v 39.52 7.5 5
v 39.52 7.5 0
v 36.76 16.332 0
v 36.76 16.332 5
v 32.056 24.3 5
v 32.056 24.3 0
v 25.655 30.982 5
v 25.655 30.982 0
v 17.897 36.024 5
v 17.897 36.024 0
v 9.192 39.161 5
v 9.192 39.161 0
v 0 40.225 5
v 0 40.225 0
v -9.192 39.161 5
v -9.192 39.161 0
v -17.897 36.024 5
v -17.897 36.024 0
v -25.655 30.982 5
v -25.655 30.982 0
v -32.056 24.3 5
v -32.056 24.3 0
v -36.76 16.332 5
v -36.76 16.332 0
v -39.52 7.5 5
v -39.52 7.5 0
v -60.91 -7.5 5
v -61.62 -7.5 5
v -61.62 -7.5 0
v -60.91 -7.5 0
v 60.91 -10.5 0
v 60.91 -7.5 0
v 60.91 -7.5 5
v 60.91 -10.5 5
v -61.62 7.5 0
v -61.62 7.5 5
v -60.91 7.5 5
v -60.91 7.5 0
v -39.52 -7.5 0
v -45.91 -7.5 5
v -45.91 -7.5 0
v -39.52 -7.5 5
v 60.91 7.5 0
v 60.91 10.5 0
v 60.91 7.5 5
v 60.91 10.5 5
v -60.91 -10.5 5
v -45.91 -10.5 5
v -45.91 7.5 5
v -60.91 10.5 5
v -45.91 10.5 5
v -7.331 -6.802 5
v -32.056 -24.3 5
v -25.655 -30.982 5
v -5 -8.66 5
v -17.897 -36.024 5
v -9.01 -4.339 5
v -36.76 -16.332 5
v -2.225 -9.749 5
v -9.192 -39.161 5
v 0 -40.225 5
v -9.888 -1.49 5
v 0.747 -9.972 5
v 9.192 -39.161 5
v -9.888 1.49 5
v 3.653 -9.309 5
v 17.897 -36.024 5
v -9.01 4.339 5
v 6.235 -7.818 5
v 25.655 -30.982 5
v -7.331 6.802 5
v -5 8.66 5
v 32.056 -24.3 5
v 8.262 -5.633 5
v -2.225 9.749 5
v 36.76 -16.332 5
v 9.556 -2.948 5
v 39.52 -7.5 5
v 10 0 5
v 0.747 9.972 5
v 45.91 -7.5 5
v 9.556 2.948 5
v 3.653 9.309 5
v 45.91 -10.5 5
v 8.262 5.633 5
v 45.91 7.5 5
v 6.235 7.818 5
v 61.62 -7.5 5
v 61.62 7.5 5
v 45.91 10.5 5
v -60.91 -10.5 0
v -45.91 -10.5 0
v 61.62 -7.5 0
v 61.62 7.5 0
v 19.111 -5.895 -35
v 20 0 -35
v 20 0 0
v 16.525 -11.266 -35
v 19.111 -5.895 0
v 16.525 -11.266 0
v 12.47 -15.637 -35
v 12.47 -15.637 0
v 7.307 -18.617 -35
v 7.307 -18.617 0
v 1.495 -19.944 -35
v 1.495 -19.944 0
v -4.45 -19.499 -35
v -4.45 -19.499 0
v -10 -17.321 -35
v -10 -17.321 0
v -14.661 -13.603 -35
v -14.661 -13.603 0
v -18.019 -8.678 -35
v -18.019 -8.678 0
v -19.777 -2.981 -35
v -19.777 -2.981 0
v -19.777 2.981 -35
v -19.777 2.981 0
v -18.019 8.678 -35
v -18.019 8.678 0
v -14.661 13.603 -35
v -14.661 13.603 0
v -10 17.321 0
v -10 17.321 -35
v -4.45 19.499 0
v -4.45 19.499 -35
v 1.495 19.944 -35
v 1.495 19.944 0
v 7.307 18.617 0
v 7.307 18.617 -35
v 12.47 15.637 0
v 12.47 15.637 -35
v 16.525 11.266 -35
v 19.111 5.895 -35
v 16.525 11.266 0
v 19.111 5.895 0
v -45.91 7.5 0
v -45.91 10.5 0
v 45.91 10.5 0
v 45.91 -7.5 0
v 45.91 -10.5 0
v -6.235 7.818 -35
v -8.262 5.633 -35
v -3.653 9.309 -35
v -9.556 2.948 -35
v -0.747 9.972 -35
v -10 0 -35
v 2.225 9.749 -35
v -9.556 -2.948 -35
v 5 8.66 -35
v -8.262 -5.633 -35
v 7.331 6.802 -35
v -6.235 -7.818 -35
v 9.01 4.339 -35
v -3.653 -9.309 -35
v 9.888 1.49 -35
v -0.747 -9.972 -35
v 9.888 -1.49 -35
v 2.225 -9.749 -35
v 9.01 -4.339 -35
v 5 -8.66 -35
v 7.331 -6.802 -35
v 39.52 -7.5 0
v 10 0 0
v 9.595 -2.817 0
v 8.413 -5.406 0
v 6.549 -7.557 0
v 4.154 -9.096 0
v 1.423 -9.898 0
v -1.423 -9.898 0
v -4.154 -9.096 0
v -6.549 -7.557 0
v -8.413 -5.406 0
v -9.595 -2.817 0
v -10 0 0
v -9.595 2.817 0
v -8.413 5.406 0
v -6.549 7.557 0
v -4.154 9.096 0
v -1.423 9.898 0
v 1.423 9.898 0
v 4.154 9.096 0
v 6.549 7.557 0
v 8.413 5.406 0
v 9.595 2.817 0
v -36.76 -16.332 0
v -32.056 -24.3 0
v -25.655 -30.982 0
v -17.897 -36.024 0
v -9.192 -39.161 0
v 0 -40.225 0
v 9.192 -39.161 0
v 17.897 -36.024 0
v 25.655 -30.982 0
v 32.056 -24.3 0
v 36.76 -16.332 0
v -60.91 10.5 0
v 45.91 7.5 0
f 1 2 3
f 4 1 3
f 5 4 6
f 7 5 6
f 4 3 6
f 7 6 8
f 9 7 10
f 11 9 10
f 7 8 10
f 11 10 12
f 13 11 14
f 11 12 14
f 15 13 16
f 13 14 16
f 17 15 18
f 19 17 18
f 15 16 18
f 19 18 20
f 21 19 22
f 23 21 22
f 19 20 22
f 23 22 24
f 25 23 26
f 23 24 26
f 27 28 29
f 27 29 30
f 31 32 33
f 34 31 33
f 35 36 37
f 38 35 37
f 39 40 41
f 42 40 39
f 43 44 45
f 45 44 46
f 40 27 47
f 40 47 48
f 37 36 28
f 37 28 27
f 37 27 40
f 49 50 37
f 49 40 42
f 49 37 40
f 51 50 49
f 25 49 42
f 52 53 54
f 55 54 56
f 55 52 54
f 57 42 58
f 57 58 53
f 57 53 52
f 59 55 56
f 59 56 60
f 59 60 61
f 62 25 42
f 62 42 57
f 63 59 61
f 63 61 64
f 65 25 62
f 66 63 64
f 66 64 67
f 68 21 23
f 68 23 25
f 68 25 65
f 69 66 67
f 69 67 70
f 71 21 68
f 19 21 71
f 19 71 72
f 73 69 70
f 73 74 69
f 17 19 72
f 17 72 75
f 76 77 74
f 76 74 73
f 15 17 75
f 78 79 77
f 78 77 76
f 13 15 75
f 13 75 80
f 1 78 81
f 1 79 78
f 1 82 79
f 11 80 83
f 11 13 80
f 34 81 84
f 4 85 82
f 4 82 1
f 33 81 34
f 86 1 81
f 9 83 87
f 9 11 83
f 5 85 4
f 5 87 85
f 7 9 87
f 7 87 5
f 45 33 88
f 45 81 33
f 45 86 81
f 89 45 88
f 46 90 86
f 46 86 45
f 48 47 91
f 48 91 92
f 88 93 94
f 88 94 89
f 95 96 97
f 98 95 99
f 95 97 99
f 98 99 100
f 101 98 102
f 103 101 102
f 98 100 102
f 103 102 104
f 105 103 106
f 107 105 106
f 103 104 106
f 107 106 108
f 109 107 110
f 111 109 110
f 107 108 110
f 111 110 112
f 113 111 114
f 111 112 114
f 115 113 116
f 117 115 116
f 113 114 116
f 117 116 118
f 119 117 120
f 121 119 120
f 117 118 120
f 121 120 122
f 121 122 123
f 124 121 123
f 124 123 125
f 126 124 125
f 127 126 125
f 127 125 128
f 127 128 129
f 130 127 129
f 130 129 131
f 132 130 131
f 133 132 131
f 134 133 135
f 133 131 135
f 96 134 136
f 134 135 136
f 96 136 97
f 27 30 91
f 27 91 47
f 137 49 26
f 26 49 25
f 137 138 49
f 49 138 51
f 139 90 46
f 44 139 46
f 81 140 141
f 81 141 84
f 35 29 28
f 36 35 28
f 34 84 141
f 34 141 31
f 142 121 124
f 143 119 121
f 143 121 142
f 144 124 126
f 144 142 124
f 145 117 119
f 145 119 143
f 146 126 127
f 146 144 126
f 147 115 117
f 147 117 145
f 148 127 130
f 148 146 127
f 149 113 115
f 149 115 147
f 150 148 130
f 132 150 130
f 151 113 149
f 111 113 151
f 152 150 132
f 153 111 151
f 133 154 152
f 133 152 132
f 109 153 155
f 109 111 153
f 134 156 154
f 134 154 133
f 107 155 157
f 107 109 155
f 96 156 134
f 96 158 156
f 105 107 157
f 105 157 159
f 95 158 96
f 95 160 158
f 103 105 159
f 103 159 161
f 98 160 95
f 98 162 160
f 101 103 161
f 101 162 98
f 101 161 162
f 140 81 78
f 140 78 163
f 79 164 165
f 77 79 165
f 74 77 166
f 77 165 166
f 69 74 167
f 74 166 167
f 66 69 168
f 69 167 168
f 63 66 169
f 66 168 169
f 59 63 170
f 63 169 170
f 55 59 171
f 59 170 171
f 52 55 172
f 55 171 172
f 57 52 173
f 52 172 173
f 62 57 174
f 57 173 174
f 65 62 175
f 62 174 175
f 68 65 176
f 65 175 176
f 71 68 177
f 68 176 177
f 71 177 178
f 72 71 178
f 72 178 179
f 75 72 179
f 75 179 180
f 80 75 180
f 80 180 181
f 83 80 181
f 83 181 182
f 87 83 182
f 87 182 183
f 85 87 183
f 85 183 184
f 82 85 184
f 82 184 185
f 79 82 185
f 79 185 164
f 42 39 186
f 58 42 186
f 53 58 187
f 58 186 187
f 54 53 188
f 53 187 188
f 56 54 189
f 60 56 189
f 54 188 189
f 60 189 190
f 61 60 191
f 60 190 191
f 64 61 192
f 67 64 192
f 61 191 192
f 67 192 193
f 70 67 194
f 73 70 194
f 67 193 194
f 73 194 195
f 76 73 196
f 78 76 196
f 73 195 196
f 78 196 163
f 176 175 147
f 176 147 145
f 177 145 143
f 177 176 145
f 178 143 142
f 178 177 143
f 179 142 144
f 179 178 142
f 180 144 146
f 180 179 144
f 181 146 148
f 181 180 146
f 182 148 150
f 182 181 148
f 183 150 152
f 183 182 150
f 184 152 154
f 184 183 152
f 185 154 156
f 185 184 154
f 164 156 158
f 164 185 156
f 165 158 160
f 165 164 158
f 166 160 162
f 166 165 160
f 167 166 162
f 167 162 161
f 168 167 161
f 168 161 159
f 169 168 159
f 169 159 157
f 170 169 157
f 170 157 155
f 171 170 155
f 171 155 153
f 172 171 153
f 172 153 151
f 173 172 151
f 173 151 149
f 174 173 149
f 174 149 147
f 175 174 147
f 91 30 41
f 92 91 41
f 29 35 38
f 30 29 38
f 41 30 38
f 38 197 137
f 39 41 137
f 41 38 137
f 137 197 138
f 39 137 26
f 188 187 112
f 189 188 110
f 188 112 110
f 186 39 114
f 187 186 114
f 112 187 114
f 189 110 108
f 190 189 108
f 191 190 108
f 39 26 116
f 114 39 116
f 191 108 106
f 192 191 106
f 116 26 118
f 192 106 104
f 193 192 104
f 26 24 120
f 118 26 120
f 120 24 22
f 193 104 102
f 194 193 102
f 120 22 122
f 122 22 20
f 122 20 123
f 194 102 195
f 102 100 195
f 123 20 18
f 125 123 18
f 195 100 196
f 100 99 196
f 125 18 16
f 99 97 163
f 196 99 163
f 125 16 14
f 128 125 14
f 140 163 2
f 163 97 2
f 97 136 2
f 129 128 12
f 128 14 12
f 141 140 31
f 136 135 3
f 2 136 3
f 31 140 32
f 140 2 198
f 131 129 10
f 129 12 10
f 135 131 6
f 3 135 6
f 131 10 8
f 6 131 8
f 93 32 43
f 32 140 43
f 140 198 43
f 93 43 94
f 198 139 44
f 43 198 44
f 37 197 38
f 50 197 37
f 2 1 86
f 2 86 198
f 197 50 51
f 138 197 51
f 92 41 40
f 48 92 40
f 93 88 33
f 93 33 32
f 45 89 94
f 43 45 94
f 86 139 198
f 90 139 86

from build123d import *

# Parameters (mm, degrees)
IZIM1_R                           = 40.225
Y_KSEKLIK_EKSTR_ZYON1_DEPTH       = 5
IZIM2_W                           = 5
IZIM2_H                           = 15
Y_KSEKLIK_EKSTR_ZYON2_DEPTH       = 64
IZIM3_W                           = 8.48037671
IZIM3_H                           = 5
KES_EKSTR_ZYON1_DEPTH             = 128
IZIM6_R                           = 25
Y_KSEKLIK_EKSTR_ZYON4_DEPTH       = 5
IZIM7_W                           = 5
IZIM7_H                           = 5
Y_KSEKLIK_EKSTR_ZYON5_DEPTH       = 2
IZIM8_W                           = 5
IZIM8_H                           = 5
Y_KSEKLIK_EKSTR_ZYON6_DEPTH       = 7
IZIM9_W                           = 5.33982185
IZIM9_H                           = 8.96327239
KES_EKSTR_ZYON2_DEPTH             = 23
IZIM10_W                          = 16.71
IZIM10_H                          = 5
Y_KSEKLIK_EKSTR_ZYON7_DEPTH       = 15
IZIM13_W                          = 0.39
IZIM13_H                          = 5
Y_KSEKLIK_EKSTR_ZYON9_DEPTH       = 15
Y_KSEKLIK_EKSTR_ZYON10_DEPTH      = 3
Y_KSEKLIK_EKSTR_ZYON10_DEPTH_BACK = 18
IZIM14_W                          = 15
IZIM14_H                          = 5
IZIM11_W                          = 15.71
IZIM11_H                          = 5
Y_KSEKLIK_EKSTR_ZYON11_DEPTH      = 15
Y_KSEKLIK_EKSTR_ZYON12_DEPTH      = 3
Y_KSEKLIK_EKSTR_ZYON12_DEPTH_BACK = 18
IZIM16_W                          = 15
IZIM16_H                          = 5
IZIM17_W                          = 120.128605811
IZIM17_H                          = 27.620146719
KES_EKSTR_ZYON3_DEPTH             = 50
IZIM18_R                          = 5
KES_EKSTR_ZYON4_DEPTH             = 100
IZIM20_R                          = 20
IZIM20_R_2                        = 10
Y_KSEKLIK_EKSTR_ZYON14_DEPTH      = 35
IZIM21_R                          = 10
KES_EKSTR_ZYON5_DEPTH             = 45


with BuildPart() as part:
    # Çizim1 → Yükseklik-Ekstrüzyon1 (new body)
    with BuildSketch(Plane.XY):
        Circle(IZIM1_R)
    extrude(amount=Y_KSEKLIK_EKSTR_ZYON1_DEPTH)

    # Çizim2 → Yükseklik-Ekstrüzyon2 (add, symmetric)
    with BuildSketch(Plane(origin=(0, 0, 0), x_dir=(0, 0, -1), z_dir=(1, 0, 0))):
        with Locations((-2.5, 0)):
            Rectangle(IZIM2_W, IZIM2_H)
    extrude(amount=Y_KSEKLIK_EKSTR_ZYON2_DEPTH, both=True)

    # Çizim3 → Kes-Ekstrüzyon1 (cut)
    with BuildSketch(Plane.XZ.offset(7.5)):
        with Locations((-59.759811645, 2.5)):
            Rectangle(IZIM3_W, IZIM3_H)
    extrude(amount=-KES_EKSTR_ZYON1_DEPTH, mode=Mode.SUBTRACT)

    # Çizim7 → Yükseklik-Ekstrüzyon5 (add)
    with BuildSketch(Plane.XY.offset(5)):
        Polygon((35.024990748, -17.334936491), (30.694863729, -14.834936491), (28.194863729, -19.165063509), (32.524990748, -21.665063509), align=None)
        with Locations((0, 36.5)):
            Rectangle(IZIM7_W, IZIM7_H)
        Polygon((-32.524990748, -21.665063509), (-28.194863729, -19.165063509), (-30.694863729, -14.834936491), (-35.024990748, -17.334936491), align=None)
    extrude(amount=Y_KSEKLIK_EKSTR_ZYON5_DEPTH)


with BuildPart() as body_2:
    # Çizim6 → Yükseklik-Ekstrüzyon4 (new body)
    with BuildSketch(Plane.XY.offset(25)):
        Circle(IZIM6_R)
    extrude(amount=Y_KSEKLIK_EKSTR_ZYON4_DEPTH)

    # Çizim8 → Yükseklik-Ekstrüzyon6 (add)
    with BuildSketch(Plane.XY.offset(30)):
        Polygon((22.034609691, -9.834936491), (17.704482672, -7.334936491), (15.204482672, -11.665063509), (19.534609691, -14.165063509), align=None)
        with Locations((0, 21.5)):
            Rectangle(IZIM8_W, IZIM8_H)
        Polygon((-19.534609691, -14.165063509), (-15.204482672, -11.665063509), (-17.704482672, -7.334936491), (-22.034609691, -9.834936491), align=None)
    extrude(amount=-Y_KSEKLIK_EKSTR_ZYON6_DEPTH)


    add(part.part)  # loft1 joins it to this body
    # loft from a face of the part (loft1)
    loft([body_2.faces().sort_by_distance((-18.619546181, -10.75, 23))[0], body_2.faces().sort_by_distance((-31.609927238, -18.25, 7))[0]])

    # loft from a face of the part (loft3)
    loft([body_2.faces().sort_by_distance((0, 36.5, 7))[0], body_2.faces().sort_by_distance((0, 21.5, 23))[0]])

    # Çizim9 → Kes-Ekstrüzyon2 (cut)
    with BuildSketch(Plane.XZ.offset(7.5)):
        with Locations((62.899534215, 2.077883617)):
            Rectangle(IZIM9_W, IZIM9_H)
    extrude(amount=-KES_EKSTR_ZYON2_DEPTH, mode=Mode.SUBTRACT)

    # Çizim10 → Yükseklik-Ekstrüzyon7 (add)
    with BuildSketch(Plane.XZ.offset(7.5)):
        with Locations((-52.87462329, 2.5)):
            Rectangle(IZIM10_W, IZIM10_H)
    extrude(amount=-Y_KSEKLIK_EKSTR_ZYON7_DEPTH)

    # Çizim13 → Yükseklik-Ekstrüzyon9 (add)
    with BuildSketch(Plane.XZ.offset(7.5)):
        with Locations((-61.42462329, 2.5)):
            Rectangle(IZIM13_W, IZIM13_H)
    extrude(amount=-Y_KSEKLIK_EKSTR_ZYON9_DEPTH)

    # Çizim14 → Yükseklik-Ekstrüzyon10 (add, two sides: drawn at the far end of the back side and taken through both)
    with BuildSketch(Plane.XZ.offset(7.5).offset(-Y_KSEKLIK_EKSTR_ZYON10_DEPTH_BACK)):
        with Locations((-53.40962329, 2.5)):
            Rectangle(IZIM14_W, IZIM14_H)
    extrude(amount=Y_KSEKLIK_EKSTR_ZYON10_DEPTH + Y_KSEKLIK_EKSTR_ZYON10_DEPTH_BACK)

    # Çizim11 → Yükseklik-Ekstrüzyon11 (add)
    with BuildSketch(Plane.XZ.offset(7.5)):
        with Locations((53.76462329, 2.5)):
            Rectangle(IZIM11_W, IZIM11_H)
    extrude(amount=-Y_KSEKLIK_EKSTR_ZYON11_DEPTH)

    # Çizim16 → Yükseklik-Ekstrüzyon12 (add, two sides: drawn at the far end of the back side and taken through both)
    with BuildSketch(Plane.XZ.offset(7.5).offset(-Y_KSEKLIK_EKSTR_ZYON12_DEPTH_BACK)):
        with Locations((53.40962329, 2.5)):
            Rectangle(IZIM16_W, IZIM16_H)
    extrude(amount=Y_KSEKLIK_EKSTR_ZYON12_DEPTH + Y_KSEKLIK_EKSTR_ZYON12_DEPTH_BACK)

    # Çizim17 → Kes-Ekstrüzyon3 (cut, symmetric)
    with BuildSketch(Plane(origin=(0, 0, 0), x_dir=(1, 0, 0), z_dir=(0, 1, 0))):
        with Locations((6.654679615, -18.81007336)):
            Rectangle(IZIM17_W, IZIM17_H)
    extrude(amount=KES_EKSTR_ZYON3_DEPTH, both=True, mode=Mode.SUBTRACT)

    # Çizim18 → Kes-Ekstrüzyon4 (cut)
    with BuildSketch(Plane(origin=(0, 0, 0), x_dir=(-1, 0, 0), z_dir=(0, 0, -1))):
        Circle(IZIM18_R)
    extrude(amount=-KES_EKSTR_ZYON4_DEPTH, mode=Mode.SUBTRACT)

    # Çizim20 → Yükseklik-Ekstrüzyon14 (add)
    with BuildSketch(Plane(origin=(0, 0, 0), x_dir=(-1, 0, 0), z_dir=(0, 0, -1))):
        with Locations(Location((0, 0, 0), (0, 0, 180))):
            Circle(IZIM20_R)
        Circle(IZIM20_R_2, mode=Mode.SUBTRACT)
    extrude(amount=Y_KSEKLIK_EKSTR_ZYON14_DEPTH)

    # Çizim21 → Kes-Ekstrüzyon5 (cut)
    with BuildSketch(Plane(origin=(0, 0, 0), x_dir=(-1, 0, 0), z_dir=(0, 0, -1))):
        with Locations(Location((0, 0, 0), (0, 0, 180))):
            Circle(IZIM21_R)
    extrude(amount=-KES_EKSTR_ZYON5_DEPTH, mode=Mode.SUBTRACT)


solid = body_2.part
